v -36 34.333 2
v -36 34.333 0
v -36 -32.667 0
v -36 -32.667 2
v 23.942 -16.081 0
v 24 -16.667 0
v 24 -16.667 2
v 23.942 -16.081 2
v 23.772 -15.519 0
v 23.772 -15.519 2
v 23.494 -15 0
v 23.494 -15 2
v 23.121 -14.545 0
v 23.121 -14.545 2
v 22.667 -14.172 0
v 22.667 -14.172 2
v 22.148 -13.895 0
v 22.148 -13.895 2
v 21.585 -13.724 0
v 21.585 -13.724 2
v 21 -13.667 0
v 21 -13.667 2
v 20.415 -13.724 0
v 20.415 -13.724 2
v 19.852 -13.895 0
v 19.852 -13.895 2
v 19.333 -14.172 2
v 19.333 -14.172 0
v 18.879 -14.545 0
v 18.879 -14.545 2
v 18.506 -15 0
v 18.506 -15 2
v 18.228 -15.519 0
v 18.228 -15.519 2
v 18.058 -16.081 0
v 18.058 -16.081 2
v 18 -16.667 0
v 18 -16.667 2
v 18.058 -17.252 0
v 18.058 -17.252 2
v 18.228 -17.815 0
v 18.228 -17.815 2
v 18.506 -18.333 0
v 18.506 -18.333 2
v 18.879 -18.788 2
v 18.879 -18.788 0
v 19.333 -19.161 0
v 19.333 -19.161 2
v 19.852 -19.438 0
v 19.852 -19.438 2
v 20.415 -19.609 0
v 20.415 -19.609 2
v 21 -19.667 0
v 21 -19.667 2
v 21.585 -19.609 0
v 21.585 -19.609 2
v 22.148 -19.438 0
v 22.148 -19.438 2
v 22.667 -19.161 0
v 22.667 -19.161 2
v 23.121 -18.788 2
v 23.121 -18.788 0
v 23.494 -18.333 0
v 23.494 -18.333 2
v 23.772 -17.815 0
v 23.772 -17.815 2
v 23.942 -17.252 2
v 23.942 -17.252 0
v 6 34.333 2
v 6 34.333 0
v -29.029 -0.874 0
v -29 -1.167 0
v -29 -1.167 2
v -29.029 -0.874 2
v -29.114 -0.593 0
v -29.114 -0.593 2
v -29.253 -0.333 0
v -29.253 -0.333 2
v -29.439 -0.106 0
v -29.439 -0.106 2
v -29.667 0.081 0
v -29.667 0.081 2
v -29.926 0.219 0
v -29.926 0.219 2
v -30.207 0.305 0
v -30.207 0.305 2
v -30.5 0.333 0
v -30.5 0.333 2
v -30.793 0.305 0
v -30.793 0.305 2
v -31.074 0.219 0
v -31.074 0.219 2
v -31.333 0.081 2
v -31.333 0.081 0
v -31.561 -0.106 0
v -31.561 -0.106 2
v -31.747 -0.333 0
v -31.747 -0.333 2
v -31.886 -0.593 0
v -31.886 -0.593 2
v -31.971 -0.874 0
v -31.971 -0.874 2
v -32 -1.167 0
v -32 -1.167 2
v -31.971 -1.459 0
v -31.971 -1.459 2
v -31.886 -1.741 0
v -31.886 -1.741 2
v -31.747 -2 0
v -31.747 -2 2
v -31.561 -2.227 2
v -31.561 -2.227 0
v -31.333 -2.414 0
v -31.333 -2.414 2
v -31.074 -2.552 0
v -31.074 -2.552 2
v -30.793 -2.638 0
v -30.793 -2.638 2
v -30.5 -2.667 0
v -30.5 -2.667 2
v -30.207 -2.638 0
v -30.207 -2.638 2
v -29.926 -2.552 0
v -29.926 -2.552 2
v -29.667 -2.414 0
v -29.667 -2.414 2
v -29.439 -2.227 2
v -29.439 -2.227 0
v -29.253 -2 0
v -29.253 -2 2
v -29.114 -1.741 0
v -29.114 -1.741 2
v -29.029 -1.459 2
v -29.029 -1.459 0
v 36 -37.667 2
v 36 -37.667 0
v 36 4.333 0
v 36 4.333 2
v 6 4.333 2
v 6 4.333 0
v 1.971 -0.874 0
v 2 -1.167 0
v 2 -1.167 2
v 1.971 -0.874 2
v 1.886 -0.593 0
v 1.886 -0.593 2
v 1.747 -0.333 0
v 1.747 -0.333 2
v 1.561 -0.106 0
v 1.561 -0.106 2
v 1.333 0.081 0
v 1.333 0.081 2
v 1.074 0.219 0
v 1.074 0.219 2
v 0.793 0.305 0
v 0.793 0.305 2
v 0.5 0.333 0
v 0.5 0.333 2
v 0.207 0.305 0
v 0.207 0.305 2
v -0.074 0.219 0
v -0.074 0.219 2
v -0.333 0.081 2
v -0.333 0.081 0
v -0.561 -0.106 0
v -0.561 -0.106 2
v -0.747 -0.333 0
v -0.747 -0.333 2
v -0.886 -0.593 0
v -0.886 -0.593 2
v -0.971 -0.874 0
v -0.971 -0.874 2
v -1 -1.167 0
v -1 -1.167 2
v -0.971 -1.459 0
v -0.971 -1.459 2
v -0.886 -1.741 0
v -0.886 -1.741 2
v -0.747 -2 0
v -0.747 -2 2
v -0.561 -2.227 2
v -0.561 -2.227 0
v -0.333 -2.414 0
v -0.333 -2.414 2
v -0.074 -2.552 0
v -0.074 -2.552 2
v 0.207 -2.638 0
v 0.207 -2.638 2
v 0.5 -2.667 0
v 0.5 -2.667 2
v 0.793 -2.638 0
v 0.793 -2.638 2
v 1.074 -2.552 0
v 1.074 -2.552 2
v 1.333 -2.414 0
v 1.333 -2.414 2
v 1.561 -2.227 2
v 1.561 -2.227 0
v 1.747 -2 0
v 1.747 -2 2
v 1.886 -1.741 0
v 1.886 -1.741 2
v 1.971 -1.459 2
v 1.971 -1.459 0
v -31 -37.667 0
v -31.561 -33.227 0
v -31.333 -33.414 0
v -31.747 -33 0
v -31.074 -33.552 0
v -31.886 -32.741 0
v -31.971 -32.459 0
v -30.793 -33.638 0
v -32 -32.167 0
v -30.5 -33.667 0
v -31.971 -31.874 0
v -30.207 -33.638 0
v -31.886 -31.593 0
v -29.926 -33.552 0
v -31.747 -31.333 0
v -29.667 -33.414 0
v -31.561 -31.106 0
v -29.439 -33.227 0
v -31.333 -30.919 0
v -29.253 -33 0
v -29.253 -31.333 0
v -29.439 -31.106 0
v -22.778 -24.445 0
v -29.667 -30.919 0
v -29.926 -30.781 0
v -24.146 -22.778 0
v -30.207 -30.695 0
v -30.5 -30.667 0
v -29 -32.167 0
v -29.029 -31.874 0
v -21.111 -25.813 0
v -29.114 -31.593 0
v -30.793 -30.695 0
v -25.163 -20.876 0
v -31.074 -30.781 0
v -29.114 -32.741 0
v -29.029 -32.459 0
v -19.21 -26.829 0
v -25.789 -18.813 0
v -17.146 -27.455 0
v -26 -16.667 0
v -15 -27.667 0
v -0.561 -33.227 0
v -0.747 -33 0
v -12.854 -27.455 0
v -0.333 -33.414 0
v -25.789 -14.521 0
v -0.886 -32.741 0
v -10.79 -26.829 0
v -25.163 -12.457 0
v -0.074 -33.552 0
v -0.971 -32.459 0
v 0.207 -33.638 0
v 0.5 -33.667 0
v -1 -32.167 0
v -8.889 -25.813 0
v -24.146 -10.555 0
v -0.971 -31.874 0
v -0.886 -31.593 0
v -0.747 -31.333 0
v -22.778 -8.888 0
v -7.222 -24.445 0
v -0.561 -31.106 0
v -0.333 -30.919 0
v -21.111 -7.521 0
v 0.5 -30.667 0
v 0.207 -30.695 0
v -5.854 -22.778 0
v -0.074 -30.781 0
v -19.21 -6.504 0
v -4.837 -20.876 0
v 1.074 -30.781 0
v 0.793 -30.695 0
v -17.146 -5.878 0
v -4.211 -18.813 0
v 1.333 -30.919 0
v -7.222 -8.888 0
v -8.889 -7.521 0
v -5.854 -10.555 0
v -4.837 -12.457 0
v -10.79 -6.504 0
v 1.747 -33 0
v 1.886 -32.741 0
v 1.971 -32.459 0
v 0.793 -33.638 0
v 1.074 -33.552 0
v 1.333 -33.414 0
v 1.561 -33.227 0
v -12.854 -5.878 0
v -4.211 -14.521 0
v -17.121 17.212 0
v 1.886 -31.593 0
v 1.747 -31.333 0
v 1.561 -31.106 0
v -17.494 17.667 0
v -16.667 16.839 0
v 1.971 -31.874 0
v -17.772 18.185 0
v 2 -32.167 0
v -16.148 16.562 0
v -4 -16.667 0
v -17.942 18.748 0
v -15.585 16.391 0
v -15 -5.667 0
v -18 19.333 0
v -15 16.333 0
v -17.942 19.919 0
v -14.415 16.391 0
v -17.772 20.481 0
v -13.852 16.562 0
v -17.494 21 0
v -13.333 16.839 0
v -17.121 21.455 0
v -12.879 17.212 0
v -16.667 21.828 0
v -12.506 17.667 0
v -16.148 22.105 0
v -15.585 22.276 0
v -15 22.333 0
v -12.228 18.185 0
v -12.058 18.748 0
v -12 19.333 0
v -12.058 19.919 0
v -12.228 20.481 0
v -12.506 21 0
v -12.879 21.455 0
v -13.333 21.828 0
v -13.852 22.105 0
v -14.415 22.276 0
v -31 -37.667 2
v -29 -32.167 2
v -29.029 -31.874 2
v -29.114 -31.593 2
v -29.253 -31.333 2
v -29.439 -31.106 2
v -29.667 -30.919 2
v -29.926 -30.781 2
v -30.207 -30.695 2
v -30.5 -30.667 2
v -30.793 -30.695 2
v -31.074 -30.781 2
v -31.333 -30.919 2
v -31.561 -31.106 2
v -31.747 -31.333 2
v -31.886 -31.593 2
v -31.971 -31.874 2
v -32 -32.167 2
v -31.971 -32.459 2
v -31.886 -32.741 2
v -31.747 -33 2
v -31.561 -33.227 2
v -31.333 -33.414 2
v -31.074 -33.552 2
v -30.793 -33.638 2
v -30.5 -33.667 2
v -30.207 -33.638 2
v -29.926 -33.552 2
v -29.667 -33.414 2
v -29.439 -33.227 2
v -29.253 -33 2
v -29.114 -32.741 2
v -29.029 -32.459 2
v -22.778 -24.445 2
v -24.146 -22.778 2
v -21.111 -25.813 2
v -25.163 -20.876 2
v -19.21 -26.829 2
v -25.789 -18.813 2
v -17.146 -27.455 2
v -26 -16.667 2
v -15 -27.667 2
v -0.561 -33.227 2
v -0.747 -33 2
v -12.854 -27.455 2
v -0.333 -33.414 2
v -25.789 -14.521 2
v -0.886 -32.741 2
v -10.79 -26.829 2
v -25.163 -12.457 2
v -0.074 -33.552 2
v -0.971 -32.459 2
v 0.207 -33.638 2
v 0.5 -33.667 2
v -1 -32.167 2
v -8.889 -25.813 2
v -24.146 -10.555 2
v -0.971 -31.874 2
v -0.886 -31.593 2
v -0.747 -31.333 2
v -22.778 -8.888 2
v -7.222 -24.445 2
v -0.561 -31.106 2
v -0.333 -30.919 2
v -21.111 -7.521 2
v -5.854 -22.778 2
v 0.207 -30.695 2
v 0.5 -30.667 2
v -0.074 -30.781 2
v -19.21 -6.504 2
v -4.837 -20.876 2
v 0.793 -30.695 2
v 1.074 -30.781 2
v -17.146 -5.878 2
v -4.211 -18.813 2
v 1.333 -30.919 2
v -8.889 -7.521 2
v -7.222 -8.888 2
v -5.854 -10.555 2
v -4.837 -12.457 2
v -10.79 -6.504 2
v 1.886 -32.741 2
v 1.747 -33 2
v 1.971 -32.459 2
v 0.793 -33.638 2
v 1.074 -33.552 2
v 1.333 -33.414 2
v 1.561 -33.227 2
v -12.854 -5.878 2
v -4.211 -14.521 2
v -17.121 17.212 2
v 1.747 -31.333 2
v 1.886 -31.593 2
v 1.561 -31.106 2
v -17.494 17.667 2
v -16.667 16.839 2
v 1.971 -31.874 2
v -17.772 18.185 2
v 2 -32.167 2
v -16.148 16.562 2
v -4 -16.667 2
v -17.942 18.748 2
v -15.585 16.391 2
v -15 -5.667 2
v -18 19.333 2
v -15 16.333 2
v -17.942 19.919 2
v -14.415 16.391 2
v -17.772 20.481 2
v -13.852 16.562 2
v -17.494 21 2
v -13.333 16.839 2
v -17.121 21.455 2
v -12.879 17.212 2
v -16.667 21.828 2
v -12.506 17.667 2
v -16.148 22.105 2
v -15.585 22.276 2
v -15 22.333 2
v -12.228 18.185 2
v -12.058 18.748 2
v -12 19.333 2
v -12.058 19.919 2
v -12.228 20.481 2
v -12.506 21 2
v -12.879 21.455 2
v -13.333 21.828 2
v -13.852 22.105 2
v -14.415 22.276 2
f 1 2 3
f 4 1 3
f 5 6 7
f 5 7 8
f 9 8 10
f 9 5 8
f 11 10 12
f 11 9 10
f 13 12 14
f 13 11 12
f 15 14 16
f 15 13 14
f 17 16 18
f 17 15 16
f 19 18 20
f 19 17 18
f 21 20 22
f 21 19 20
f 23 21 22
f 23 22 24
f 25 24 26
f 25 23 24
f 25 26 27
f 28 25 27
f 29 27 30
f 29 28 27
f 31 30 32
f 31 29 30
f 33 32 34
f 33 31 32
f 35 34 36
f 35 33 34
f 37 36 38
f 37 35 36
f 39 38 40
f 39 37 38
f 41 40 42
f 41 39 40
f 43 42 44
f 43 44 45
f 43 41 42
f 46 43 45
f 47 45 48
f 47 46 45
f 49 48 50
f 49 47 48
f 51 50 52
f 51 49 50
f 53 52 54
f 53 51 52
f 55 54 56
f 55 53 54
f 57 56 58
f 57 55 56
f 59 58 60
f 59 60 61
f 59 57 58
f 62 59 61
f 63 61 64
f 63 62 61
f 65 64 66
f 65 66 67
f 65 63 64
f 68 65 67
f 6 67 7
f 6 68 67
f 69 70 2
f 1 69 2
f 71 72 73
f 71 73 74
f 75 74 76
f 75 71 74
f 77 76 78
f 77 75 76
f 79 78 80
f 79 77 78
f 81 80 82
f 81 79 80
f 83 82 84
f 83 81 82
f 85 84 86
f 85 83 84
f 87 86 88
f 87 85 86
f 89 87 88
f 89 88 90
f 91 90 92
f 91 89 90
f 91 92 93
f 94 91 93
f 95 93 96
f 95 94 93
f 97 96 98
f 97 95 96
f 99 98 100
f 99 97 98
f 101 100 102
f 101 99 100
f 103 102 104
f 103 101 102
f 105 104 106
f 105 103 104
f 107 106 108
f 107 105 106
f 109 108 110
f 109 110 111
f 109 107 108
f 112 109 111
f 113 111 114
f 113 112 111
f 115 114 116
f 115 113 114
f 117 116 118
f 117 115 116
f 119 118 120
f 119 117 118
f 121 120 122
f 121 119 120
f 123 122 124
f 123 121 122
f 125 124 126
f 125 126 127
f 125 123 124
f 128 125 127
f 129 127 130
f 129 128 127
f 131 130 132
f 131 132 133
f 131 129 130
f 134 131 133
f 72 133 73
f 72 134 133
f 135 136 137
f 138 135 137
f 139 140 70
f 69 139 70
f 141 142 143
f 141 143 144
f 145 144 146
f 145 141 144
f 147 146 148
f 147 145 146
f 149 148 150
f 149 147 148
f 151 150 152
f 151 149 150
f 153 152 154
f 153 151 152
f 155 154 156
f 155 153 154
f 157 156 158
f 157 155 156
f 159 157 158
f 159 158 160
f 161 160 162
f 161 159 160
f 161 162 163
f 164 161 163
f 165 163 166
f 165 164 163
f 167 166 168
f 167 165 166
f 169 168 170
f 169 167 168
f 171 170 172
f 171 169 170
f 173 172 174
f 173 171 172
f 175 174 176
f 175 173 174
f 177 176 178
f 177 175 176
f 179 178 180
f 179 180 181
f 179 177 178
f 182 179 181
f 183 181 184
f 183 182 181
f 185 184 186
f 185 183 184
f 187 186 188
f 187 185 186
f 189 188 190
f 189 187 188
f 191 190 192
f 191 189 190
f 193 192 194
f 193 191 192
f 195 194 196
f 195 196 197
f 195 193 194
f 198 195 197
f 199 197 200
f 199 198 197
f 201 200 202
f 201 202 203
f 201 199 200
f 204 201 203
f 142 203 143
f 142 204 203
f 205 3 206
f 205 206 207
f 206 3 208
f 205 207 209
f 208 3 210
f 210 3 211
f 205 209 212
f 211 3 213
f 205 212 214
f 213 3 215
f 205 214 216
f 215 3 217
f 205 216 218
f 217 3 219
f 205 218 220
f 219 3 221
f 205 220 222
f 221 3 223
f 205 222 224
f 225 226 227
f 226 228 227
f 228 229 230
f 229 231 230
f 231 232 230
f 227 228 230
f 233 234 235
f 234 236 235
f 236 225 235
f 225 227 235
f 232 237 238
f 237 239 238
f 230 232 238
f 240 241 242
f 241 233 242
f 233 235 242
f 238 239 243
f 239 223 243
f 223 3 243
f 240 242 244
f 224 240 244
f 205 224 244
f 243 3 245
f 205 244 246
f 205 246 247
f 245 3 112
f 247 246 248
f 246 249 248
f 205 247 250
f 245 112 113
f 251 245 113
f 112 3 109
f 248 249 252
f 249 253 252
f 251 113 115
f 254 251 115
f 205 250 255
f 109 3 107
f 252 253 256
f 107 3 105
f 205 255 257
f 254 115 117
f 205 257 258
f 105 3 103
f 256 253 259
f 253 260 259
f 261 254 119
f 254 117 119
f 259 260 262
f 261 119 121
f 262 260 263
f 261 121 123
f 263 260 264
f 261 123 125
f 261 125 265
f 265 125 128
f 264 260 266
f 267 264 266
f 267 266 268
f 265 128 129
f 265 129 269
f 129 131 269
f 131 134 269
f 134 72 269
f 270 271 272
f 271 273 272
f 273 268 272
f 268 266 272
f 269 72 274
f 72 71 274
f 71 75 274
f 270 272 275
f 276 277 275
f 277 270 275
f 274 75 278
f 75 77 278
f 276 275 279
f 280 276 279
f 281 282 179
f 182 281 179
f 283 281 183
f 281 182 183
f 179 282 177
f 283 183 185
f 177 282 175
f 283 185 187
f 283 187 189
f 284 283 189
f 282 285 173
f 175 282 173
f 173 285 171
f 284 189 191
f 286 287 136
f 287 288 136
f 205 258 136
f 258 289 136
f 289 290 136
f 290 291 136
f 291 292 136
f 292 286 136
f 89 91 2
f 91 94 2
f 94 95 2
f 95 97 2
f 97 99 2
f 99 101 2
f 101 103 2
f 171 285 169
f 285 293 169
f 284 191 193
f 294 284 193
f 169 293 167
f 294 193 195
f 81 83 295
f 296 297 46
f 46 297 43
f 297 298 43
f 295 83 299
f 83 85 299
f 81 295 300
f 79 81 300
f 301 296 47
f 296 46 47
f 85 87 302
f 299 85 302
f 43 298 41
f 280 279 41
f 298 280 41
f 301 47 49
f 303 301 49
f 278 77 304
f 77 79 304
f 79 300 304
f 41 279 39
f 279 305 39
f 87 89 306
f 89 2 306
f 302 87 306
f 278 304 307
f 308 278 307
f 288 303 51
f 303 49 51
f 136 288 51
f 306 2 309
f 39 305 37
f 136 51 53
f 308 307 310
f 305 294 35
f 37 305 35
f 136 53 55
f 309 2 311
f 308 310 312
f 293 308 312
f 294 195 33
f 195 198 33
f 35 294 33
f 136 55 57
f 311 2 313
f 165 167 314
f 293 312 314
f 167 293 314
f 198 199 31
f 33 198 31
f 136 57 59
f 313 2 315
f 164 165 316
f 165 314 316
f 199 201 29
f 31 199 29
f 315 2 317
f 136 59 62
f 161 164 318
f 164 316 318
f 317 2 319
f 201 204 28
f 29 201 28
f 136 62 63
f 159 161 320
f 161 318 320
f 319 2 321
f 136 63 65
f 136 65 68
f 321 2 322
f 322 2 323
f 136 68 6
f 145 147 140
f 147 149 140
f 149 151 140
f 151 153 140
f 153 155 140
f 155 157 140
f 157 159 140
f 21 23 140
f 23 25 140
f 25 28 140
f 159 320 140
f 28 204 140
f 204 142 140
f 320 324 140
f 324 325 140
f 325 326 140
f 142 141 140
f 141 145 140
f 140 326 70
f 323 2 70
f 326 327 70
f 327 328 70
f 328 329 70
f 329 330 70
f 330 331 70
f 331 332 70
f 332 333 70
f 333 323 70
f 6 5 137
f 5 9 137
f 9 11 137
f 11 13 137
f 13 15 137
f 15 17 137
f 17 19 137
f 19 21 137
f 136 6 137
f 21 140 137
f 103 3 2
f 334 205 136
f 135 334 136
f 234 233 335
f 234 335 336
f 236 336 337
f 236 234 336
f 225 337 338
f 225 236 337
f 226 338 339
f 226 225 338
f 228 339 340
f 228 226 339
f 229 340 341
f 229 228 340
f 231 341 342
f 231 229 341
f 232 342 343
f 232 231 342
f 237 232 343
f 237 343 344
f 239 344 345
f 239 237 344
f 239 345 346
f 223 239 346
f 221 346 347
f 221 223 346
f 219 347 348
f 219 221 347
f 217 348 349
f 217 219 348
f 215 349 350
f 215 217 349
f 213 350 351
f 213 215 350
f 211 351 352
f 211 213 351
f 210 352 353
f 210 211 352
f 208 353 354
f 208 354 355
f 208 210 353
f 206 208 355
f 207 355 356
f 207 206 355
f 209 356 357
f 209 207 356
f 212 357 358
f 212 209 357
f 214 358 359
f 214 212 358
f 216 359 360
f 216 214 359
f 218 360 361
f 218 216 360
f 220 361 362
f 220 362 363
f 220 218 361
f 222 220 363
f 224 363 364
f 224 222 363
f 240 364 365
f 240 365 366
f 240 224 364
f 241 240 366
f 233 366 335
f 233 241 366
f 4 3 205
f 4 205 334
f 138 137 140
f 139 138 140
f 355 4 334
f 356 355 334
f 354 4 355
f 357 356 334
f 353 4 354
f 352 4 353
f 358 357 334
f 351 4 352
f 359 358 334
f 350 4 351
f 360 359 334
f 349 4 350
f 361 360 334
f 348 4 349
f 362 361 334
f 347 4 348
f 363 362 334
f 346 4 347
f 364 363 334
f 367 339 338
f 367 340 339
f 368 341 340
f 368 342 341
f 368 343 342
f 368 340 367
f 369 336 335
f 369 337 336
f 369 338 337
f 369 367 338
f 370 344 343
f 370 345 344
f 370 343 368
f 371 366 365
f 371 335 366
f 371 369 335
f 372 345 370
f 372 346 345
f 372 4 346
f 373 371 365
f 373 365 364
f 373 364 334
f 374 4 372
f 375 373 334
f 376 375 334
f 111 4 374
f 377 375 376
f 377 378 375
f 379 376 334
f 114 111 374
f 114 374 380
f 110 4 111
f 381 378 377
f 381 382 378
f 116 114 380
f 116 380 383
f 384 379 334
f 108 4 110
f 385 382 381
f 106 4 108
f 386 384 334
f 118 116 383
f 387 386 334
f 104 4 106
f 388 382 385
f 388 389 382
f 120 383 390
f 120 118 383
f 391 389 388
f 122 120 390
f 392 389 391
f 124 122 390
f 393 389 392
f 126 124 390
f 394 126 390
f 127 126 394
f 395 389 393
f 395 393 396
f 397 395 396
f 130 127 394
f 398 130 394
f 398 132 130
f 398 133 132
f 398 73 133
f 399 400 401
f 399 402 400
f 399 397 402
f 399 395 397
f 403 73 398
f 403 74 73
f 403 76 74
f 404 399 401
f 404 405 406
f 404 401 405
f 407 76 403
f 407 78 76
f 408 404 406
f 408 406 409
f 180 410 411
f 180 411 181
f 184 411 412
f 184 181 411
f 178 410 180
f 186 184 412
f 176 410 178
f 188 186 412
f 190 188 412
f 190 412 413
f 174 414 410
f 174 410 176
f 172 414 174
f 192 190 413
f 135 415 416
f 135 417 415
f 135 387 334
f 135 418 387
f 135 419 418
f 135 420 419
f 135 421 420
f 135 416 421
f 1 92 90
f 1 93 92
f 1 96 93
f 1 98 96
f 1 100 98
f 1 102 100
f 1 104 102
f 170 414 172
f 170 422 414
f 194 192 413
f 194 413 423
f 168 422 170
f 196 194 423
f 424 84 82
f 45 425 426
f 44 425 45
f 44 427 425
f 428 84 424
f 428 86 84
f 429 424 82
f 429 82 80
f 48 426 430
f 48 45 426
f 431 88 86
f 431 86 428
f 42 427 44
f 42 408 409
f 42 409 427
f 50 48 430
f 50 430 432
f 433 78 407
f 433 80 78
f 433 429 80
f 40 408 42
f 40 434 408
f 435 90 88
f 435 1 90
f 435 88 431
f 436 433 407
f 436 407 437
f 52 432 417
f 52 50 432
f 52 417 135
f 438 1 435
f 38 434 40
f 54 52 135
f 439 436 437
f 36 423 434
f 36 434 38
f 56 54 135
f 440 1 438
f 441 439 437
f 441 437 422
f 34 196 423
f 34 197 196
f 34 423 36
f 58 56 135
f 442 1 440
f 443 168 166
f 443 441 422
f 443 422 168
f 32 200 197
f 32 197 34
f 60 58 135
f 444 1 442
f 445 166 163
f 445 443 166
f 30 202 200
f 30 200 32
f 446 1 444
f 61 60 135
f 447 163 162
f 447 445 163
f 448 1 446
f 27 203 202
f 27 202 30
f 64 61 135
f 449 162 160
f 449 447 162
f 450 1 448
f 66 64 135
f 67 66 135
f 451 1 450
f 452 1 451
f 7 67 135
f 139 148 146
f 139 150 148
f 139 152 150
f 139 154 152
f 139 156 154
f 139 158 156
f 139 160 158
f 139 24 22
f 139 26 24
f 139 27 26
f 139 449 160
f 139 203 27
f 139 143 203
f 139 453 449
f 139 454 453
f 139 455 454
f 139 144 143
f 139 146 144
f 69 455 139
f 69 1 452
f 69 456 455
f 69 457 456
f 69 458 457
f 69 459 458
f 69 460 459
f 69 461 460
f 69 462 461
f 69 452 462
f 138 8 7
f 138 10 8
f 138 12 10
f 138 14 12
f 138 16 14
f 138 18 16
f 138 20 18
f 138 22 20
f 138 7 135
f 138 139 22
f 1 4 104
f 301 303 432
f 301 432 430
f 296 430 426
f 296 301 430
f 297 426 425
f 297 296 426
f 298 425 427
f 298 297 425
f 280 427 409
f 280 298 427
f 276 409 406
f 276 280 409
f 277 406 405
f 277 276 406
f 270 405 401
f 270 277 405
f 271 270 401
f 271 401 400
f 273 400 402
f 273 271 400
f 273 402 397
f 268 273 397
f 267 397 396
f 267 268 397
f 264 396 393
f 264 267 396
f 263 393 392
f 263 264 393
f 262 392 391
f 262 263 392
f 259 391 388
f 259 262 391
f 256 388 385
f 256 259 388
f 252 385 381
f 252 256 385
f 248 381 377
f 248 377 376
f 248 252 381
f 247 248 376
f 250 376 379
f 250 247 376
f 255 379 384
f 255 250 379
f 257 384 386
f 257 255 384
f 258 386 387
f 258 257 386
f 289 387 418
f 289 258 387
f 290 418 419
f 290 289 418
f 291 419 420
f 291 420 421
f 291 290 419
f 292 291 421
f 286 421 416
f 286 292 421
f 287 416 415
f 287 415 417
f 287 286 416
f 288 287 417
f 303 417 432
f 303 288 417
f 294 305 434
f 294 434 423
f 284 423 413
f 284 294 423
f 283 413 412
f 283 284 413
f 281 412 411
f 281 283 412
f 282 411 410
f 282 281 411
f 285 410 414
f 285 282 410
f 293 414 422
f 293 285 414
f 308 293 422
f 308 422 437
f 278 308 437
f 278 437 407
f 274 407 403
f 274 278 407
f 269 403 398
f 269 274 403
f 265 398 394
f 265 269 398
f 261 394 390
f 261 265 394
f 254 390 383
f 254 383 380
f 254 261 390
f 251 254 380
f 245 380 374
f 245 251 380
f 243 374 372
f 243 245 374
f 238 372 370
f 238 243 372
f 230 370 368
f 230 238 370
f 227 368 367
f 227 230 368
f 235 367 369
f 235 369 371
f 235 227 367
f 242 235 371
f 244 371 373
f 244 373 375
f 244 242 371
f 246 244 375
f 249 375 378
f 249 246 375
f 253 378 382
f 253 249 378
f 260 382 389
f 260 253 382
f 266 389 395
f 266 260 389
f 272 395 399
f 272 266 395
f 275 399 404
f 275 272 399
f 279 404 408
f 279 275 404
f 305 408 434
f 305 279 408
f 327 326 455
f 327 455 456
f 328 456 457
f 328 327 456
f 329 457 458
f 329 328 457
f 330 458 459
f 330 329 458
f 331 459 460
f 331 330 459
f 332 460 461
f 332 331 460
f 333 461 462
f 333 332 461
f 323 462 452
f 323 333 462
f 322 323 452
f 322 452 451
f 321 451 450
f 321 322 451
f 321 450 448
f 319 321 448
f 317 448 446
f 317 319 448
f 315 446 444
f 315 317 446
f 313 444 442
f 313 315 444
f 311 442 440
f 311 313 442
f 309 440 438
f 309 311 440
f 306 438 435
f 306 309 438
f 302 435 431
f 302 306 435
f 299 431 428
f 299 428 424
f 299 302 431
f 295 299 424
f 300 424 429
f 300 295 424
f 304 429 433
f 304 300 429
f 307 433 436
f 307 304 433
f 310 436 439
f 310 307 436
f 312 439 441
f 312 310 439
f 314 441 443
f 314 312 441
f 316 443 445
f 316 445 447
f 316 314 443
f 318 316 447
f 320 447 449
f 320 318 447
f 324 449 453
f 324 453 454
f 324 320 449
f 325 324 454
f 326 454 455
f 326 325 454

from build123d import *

# Parameters (mm, degrees)
F0_R     = 1.5
F0_R_2   = 11
F0_R_3   = 3
F1_DEPTH = 2
F2_SIZE  = 5


with BuildPart() as f1:
    # F0 (on Top) → F1 (new body)
    with BuildSketch(Plane.XY):
        Polygon((-36, -37.666667), (36, -37.666667), (36, 4.333333), (6, 4.333333), (6, 34.333333), (-36, 34.333333), align=None)
        with Locations((-30.5, -32.166667)):
            Circle(F0_R, mode=Mode.SUBTRACT)
        with Locations((-15, -16.666667)):
            Circle(F0_R_2, mode=Mode.SUBTRACT)
        with Locations((0.5, -32.166667)):
            Circle(F0_R, mode=Mode.SUBTRACT)
        with Locations((21, -16.666667)):
            Circle(F0_R_3, mode=Mode.SUBTRACT)
        with Locations((-30.5, -1.166667)):
            Circle(F0_R, mode=Mode.SUBTRACT)
        with Locations((-15, 19.333333)):
            Circle(F0_R_3, mode=Mode.SUBTRACT)
        with Locations((0.5, -1.166667)):
            Circle(F0_R, mode=Mode.SUBTRACT)
    extrude(amount=F1_DEPTH)

    # F2
    f2_edges = [f1.edges().sort_by_distance(p)[0] for p in [
        (-36, -37.666667, 1),
    ]]
    chamfer(f2_edges, length=F2_SIZE)


solid = f1.part
